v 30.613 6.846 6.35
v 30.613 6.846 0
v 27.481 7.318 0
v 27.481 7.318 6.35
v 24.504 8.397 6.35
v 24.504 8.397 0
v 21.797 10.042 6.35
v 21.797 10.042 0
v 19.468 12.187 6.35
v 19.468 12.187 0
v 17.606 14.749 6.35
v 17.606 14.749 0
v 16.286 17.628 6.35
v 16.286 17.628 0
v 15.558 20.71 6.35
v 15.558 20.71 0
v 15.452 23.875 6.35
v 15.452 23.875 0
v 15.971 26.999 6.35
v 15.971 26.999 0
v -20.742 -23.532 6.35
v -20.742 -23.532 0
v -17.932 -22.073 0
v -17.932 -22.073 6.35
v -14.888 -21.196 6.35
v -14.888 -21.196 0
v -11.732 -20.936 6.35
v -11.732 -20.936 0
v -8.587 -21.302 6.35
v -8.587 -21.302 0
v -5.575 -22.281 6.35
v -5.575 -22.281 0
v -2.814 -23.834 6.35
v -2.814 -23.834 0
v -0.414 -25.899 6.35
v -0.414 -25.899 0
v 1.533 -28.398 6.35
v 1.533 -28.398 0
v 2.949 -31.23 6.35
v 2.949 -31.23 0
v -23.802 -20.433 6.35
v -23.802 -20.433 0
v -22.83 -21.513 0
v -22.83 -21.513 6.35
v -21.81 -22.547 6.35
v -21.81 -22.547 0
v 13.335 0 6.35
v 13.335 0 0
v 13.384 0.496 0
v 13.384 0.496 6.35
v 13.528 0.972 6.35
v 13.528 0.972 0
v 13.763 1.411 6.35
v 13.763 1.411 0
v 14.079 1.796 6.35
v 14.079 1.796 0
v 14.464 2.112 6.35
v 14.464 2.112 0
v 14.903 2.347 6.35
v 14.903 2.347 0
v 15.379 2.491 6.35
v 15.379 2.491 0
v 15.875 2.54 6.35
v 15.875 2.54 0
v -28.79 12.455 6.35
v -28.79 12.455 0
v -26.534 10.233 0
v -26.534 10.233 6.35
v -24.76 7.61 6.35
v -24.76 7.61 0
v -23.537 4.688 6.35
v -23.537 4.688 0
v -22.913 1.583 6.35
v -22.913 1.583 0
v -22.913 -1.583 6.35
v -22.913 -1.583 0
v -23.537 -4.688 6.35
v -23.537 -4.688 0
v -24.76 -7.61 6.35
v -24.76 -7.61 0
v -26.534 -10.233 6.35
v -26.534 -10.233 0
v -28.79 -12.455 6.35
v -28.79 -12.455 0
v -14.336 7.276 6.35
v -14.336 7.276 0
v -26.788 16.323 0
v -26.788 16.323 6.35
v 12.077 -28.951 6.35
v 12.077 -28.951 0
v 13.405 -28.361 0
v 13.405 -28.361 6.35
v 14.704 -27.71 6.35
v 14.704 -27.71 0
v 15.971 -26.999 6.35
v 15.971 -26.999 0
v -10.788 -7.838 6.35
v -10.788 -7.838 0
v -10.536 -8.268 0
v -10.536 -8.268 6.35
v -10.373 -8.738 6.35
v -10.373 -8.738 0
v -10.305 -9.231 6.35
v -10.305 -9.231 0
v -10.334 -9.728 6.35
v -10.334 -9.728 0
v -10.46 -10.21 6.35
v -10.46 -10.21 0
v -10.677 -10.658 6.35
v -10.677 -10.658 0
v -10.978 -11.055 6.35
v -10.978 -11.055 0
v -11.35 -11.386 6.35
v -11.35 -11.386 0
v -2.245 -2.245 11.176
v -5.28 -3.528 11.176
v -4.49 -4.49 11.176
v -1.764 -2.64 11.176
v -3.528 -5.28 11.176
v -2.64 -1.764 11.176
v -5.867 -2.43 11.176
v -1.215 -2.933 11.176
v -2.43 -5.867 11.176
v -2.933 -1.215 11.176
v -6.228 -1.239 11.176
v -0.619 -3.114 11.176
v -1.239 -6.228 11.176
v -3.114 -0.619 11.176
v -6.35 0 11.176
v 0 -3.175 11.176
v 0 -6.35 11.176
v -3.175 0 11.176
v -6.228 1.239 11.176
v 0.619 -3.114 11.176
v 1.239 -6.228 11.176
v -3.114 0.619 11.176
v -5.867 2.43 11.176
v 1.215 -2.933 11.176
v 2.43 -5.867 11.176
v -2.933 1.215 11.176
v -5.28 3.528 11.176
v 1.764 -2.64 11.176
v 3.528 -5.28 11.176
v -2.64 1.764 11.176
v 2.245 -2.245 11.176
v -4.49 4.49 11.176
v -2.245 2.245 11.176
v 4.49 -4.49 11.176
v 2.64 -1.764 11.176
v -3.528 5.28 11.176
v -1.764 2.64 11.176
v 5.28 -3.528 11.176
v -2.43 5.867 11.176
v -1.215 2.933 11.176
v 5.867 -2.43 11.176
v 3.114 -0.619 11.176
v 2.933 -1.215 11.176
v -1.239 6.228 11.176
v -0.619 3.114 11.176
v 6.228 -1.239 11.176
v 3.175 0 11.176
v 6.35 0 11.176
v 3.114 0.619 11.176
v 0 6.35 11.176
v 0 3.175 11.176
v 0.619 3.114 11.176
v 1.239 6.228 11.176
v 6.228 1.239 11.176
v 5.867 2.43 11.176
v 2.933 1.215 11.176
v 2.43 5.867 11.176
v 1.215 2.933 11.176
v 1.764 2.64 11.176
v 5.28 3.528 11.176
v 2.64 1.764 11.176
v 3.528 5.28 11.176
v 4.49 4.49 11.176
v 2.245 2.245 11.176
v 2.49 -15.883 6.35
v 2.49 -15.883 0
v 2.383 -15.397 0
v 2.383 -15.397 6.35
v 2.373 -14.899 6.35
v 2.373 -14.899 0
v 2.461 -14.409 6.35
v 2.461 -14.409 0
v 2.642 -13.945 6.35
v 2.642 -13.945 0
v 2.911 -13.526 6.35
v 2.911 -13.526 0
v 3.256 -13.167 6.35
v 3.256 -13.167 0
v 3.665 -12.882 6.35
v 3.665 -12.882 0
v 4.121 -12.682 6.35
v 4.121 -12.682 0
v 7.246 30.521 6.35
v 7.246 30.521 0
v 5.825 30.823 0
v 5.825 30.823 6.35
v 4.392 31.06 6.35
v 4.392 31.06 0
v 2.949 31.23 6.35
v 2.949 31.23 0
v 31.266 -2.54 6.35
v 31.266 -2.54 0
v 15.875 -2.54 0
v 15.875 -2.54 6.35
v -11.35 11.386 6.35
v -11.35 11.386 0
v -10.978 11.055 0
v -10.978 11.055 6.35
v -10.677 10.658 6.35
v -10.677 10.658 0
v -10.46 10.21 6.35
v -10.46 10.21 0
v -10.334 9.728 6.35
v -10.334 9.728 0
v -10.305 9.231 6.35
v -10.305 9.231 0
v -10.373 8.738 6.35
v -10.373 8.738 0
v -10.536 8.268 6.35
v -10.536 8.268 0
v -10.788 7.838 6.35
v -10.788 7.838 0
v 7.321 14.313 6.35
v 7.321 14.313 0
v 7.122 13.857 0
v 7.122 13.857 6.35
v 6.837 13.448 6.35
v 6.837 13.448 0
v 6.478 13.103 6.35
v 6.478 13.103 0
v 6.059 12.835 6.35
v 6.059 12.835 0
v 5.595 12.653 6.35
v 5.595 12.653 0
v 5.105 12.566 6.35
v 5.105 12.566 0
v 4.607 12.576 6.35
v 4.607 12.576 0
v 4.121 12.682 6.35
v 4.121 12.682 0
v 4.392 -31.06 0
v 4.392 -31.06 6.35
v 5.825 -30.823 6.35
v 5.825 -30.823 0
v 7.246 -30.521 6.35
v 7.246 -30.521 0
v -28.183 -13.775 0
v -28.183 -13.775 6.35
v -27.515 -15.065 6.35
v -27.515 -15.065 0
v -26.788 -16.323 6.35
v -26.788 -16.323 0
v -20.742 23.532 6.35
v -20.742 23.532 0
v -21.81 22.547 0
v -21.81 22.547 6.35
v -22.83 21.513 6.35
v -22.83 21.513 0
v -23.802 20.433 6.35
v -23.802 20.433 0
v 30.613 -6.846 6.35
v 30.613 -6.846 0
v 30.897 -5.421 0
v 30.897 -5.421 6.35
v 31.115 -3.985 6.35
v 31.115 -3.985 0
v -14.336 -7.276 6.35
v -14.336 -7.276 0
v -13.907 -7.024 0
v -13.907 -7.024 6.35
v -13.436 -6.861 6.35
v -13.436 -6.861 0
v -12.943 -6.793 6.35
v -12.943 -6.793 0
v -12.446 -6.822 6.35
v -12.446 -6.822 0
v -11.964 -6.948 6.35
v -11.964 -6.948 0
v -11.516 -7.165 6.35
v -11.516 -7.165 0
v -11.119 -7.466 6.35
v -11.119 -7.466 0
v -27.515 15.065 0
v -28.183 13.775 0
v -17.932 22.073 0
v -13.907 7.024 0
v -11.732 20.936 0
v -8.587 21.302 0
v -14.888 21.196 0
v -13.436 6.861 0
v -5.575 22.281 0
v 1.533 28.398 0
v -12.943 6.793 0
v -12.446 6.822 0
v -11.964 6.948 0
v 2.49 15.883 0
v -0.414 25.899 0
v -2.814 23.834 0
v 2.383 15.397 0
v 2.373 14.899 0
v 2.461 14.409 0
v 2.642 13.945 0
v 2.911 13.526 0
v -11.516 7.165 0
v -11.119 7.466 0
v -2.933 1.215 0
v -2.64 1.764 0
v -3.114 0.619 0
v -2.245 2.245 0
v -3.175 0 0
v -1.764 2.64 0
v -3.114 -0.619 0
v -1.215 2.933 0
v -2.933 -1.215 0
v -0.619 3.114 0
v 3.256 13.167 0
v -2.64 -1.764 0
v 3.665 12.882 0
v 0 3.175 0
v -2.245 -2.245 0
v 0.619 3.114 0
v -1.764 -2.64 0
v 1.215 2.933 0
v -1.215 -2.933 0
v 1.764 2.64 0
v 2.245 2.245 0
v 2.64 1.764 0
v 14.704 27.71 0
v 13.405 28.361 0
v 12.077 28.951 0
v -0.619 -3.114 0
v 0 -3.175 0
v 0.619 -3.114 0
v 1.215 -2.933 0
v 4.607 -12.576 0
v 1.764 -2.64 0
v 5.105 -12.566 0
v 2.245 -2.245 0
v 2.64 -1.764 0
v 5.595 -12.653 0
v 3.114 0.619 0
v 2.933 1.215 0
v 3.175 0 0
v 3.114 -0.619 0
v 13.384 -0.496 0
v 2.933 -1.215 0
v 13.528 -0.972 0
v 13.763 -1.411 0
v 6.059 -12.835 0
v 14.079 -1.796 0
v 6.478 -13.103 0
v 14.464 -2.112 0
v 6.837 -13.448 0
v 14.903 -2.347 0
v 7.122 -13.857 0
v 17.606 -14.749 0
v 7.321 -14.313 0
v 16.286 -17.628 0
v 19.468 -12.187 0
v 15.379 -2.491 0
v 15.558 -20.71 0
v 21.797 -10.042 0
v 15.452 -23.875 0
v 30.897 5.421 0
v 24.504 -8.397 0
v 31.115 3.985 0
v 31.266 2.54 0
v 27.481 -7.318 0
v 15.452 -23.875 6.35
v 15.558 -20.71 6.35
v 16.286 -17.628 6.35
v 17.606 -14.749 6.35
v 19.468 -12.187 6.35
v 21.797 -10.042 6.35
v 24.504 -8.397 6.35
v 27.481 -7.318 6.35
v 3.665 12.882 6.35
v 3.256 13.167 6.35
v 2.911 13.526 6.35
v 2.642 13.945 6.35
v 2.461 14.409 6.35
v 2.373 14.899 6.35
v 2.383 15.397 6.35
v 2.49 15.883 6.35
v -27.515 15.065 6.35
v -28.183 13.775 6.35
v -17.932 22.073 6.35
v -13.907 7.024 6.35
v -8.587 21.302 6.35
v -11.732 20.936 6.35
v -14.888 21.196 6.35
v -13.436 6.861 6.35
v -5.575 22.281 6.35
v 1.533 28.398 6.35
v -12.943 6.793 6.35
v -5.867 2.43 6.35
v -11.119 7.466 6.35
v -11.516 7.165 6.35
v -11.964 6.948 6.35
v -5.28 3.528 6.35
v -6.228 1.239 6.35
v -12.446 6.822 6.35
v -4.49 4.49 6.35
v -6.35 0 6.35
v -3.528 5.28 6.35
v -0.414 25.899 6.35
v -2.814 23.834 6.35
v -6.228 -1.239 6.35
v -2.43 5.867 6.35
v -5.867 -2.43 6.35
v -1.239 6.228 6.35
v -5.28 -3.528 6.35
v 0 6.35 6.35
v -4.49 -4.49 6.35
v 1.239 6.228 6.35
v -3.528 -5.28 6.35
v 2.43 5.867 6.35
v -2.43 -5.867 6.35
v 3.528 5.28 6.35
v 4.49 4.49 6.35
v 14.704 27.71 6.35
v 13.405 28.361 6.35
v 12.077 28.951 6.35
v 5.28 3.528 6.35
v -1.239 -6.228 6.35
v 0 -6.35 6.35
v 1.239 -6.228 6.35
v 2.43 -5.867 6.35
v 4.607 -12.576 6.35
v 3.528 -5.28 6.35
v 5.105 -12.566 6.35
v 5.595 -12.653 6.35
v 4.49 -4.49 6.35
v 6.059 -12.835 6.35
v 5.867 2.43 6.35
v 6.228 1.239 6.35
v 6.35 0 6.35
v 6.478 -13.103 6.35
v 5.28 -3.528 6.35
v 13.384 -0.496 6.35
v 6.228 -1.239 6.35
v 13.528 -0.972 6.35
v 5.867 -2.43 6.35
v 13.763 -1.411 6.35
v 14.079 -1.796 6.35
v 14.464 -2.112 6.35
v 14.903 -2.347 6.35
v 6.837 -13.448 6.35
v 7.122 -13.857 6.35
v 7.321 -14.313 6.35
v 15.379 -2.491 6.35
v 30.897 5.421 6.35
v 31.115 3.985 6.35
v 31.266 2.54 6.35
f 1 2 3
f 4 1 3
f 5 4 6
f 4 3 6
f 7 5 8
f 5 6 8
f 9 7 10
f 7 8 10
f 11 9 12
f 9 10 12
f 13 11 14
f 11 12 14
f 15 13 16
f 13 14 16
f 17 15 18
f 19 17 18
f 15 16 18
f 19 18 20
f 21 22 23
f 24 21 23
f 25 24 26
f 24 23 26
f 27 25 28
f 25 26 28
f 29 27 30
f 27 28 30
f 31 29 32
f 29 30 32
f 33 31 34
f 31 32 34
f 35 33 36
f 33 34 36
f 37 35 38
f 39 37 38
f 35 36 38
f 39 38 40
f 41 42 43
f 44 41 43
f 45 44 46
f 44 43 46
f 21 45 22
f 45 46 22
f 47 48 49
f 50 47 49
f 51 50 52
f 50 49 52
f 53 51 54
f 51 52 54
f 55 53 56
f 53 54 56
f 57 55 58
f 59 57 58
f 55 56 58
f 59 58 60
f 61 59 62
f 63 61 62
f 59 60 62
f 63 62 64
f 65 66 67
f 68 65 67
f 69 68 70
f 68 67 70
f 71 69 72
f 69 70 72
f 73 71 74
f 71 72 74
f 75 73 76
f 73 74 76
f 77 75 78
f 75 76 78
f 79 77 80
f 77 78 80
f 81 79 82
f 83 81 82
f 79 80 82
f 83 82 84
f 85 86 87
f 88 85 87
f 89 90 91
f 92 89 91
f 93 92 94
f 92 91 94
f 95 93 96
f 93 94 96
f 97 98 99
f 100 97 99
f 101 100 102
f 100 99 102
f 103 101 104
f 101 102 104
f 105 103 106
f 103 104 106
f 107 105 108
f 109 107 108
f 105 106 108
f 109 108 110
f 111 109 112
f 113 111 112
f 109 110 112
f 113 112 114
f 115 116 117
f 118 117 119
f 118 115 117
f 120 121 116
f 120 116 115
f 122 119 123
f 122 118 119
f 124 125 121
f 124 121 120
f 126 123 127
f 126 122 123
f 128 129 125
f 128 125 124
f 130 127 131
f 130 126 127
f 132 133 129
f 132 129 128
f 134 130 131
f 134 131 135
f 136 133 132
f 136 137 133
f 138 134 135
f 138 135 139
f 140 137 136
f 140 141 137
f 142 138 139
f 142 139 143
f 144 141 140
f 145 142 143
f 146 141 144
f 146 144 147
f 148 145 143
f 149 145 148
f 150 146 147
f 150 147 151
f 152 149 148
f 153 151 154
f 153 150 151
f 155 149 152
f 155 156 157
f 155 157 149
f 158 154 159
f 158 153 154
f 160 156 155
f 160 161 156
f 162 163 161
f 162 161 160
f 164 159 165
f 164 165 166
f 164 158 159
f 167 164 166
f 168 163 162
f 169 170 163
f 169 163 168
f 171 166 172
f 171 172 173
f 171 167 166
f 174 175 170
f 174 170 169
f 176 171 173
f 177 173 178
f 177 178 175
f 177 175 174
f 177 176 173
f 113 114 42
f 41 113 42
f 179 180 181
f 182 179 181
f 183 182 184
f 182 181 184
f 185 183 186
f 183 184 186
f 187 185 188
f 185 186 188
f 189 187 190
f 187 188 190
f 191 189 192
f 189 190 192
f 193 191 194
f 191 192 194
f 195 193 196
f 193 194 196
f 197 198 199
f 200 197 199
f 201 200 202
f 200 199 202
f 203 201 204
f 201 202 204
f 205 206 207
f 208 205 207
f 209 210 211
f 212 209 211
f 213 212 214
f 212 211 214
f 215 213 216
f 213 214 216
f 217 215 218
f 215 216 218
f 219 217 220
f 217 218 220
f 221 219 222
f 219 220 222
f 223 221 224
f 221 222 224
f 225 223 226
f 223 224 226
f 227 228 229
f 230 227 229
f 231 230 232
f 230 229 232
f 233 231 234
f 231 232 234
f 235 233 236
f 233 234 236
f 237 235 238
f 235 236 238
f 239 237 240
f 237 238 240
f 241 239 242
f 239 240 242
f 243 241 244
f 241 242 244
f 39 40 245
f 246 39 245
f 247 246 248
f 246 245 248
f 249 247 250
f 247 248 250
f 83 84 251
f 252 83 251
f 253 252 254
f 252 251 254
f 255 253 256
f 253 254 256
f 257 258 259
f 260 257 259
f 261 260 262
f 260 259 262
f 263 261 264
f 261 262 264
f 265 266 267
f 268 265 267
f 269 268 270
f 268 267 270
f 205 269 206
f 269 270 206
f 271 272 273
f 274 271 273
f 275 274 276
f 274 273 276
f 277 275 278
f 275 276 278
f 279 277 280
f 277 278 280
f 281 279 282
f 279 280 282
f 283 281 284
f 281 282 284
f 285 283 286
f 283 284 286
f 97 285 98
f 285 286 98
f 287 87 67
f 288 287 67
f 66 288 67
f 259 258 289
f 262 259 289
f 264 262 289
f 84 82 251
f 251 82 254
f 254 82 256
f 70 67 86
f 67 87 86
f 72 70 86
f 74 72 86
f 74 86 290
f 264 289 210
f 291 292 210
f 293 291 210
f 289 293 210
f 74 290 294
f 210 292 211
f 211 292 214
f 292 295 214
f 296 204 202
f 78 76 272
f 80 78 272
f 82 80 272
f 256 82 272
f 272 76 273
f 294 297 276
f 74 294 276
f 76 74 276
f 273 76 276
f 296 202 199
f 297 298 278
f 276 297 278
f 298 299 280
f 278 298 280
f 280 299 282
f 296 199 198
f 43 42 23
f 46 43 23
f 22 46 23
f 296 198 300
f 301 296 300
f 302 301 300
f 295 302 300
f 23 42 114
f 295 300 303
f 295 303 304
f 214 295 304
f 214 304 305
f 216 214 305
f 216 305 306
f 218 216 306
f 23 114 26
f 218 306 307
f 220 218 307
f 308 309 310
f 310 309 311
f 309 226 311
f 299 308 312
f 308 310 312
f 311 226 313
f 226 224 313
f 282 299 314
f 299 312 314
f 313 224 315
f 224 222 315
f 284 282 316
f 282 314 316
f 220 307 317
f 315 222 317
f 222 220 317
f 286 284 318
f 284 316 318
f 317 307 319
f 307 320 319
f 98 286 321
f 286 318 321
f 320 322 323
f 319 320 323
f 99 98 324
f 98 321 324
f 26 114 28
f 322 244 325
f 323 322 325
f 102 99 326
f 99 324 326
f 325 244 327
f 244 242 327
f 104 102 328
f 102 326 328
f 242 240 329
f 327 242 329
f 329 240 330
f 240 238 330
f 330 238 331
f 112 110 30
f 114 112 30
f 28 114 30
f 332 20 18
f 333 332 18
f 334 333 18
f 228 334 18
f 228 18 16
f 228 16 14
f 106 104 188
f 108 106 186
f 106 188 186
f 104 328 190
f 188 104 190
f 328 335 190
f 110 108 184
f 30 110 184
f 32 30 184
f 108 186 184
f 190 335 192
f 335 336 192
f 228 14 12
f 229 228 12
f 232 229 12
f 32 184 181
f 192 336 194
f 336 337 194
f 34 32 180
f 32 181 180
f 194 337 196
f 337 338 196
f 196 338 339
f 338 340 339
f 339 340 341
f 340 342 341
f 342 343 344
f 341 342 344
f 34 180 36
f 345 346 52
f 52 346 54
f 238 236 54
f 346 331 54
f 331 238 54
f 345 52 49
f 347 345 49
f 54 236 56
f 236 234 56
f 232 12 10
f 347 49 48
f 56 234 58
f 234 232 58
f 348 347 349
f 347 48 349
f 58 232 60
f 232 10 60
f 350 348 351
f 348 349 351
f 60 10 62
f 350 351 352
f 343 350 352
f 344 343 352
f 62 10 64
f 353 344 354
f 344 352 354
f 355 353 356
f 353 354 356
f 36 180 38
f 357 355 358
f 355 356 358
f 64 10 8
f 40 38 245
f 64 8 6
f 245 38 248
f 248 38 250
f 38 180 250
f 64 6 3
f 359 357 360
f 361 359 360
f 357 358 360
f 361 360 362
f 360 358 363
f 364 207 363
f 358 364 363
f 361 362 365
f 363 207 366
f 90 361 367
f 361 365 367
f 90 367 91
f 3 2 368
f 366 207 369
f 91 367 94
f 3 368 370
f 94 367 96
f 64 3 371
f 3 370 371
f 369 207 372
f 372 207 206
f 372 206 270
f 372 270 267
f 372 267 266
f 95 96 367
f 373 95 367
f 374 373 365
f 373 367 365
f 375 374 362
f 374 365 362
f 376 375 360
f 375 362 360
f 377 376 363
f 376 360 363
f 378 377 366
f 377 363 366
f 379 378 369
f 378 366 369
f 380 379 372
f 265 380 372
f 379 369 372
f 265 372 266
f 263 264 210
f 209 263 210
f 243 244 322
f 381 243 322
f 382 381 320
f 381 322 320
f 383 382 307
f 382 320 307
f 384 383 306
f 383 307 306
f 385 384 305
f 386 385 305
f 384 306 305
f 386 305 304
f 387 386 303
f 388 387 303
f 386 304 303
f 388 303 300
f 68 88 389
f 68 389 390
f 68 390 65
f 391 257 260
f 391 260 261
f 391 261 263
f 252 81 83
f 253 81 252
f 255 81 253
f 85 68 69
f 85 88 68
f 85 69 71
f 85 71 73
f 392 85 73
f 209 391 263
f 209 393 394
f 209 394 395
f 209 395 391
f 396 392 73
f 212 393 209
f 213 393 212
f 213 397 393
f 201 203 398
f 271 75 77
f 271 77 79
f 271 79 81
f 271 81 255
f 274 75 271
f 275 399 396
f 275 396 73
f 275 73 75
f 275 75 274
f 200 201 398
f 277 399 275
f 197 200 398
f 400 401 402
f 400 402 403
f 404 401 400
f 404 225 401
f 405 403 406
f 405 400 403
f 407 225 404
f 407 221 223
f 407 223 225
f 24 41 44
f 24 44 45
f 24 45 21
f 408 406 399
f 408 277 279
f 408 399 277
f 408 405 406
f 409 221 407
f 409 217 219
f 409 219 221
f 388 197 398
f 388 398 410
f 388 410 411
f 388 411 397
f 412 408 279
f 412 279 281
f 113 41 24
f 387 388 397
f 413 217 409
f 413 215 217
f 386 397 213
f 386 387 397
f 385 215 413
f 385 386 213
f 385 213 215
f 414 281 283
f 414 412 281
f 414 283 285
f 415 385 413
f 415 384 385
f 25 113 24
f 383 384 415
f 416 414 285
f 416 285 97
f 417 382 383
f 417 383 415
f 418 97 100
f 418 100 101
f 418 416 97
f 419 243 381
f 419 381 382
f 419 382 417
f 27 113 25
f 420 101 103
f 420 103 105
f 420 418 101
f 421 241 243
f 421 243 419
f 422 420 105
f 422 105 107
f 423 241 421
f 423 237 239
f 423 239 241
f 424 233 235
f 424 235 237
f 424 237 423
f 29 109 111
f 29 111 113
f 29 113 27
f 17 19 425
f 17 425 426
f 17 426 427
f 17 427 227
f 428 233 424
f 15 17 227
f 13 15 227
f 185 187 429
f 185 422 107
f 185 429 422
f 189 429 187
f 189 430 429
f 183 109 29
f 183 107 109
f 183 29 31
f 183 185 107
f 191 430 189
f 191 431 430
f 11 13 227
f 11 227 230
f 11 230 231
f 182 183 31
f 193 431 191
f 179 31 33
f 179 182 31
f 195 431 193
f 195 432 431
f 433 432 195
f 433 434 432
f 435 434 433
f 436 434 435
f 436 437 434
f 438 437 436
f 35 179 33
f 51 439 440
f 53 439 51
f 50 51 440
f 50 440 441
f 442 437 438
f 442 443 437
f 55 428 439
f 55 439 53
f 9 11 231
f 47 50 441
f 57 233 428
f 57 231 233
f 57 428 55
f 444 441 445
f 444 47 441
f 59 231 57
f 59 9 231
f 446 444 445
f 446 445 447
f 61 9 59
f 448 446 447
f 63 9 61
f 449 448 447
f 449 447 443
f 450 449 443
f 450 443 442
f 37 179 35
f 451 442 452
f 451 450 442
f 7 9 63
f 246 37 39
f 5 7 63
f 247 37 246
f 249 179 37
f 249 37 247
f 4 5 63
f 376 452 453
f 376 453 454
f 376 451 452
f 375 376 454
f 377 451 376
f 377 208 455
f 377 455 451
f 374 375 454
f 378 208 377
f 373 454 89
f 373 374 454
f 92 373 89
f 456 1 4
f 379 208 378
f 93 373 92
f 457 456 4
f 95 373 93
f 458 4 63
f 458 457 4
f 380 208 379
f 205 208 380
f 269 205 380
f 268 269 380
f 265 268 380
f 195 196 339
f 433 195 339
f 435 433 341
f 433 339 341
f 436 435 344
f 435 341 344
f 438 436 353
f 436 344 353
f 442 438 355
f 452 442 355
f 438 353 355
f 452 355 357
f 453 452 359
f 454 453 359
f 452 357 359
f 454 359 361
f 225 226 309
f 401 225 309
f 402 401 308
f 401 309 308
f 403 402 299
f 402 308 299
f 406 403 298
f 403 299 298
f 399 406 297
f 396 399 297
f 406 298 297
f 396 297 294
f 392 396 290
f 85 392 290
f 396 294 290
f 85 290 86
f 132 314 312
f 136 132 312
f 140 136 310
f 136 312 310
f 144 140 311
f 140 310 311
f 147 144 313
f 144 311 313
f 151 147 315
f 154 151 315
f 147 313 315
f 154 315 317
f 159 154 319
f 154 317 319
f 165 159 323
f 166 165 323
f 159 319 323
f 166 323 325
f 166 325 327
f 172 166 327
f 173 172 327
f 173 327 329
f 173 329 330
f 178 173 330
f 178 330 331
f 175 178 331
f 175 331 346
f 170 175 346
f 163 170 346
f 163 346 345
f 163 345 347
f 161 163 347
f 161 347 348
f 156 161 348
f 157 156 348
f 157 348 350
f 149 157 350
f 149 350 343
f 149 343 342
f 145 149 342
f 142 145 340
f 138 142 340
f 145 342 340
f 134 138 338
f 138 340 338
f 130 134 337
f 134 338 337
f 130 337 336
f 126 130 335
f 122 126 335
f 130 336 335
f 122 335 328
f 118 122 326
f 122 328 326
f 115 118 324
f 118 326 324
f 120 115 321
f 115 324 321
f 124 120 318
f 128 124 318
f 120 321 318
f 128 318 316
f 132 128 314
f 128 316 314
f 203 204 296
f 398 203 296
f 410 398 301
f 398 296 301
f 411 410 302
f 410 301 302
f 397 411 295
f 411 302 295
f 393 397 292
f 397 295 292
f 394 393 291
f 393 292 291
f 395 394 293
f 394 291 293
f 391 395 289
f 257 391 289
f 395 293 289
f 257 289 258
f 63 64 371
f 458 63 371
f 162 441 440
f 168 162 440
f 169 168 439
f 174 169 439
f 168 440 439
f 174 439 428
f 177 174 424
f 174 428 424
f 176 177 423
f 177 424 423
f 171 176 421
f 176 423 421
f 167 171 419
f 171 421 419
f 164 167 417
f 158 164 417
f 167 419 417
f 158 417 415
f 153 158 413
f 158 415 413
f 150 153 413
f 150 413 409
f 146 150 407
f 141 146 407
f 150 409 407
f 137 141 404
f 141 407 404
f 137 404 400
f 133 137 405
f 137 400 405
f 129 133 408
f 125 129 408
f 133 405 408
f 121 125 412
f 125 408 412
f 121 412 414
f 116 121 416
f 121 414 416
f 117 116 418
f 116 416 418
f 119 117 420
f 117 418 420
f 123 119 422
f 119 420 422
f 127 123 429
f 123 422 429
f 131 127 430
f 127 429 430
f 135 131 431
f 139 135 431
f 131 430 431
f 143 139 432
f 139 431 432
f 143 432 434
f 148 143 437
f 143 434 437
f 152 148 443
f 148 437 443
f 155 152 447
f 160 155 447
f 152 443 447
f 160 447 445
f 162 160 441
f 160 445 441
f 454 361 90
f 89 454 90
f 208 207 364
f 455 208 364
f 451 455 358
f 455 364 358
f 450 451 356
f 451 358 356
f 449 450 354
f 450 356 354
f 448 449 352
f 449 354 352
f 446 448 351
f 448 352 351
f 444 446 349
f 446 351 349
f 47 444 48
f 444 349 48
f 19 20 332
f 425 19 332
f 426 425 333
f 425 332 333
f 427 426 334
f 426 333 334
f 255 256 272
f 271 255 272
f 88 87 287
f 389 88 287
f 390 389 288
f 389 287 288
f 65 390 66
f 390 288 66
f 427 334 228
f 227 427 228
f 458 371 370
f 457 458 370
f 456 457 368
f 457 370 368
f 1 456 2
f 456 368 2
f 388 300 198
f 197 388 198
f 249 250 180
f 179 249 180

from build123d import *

# Parameters (mm, degrees)
BOSS_EXTRUDE1_DEPTH         = 6.35
CIRPATTERN1_COUNT           = 5
SKETCH3_R                   = 6.35
BOSS_EXTRUDE2_DEPTH         = 4.826
F_1_4_0_25_DIAMETER_HOLE1_D = 6.35


with BuildPart() as part:
    # Sketch2 → Boss-Extrude1 (new body)
    with BuildSketch(Plane.XY):
        with BuildLine():
            Line((4.12074162, 12.682338645), (0, 0))
            Line((0, 0), (13.335, 0))
            ThreePointArc((13.335, 0), (14.078948776, 1.796051224), (15.875, 2.54))
            Line((15.875, 2.54), (31.265996882, 2.54))
            ThreePointArc((31.265996882, 2.54), (31.014248813, 4.704309891), (30.612864998, 6.845922701))
            ThreePointArc((30.612864998, 6.845922701), (18.47357946, 13.421841122), (15.970754926, 26.999058282))
            ThreePointArc((15.970754926, 26.999058282), (14.057994528, 28.042591729), (12.077407934, 28.950826907))
            Line((12.077407934, 28.950826907), (7.321328337, 14.31311903))
            ThreePointArc((7.321328337, 14.31311903), (6.058780655, 12.834865625), (4.12074162, 12.682338645))
        make_face()
    boss_extrude1 = extrude(amount=BOSS_EXTRUDE1_DEPTH)

    # CirPattern1: Boss-Extrude1 ×5 about axis
    cirpattern1_axis = Axis((0, 0, 0), (0, 0, 1))
    for i in range(1, CIRPATTERN1_COUNT):
        add(boss_extrude1.rotate(cirpattern1_axis, i * 360 / CIRPATTERN1_COUNT))

    # Sketch3 → Boss-Extrude2 (add)
    with BuildSketch(Plane.XY.offset(6.35)):
        Circle(SKETCH3_R)
    extrude(amount=BOSS_EXTRUDE2_DEPTH)

    # 1/4 (0.25) Diameter Hole1 (through all)
    with Locations(Plane.XY.offset(11.176)):
        with Locations((0, 0)):
            Hole(F_1_4_0_25_DIAMETER_HOLE1_D / 2)


solid = part.part
